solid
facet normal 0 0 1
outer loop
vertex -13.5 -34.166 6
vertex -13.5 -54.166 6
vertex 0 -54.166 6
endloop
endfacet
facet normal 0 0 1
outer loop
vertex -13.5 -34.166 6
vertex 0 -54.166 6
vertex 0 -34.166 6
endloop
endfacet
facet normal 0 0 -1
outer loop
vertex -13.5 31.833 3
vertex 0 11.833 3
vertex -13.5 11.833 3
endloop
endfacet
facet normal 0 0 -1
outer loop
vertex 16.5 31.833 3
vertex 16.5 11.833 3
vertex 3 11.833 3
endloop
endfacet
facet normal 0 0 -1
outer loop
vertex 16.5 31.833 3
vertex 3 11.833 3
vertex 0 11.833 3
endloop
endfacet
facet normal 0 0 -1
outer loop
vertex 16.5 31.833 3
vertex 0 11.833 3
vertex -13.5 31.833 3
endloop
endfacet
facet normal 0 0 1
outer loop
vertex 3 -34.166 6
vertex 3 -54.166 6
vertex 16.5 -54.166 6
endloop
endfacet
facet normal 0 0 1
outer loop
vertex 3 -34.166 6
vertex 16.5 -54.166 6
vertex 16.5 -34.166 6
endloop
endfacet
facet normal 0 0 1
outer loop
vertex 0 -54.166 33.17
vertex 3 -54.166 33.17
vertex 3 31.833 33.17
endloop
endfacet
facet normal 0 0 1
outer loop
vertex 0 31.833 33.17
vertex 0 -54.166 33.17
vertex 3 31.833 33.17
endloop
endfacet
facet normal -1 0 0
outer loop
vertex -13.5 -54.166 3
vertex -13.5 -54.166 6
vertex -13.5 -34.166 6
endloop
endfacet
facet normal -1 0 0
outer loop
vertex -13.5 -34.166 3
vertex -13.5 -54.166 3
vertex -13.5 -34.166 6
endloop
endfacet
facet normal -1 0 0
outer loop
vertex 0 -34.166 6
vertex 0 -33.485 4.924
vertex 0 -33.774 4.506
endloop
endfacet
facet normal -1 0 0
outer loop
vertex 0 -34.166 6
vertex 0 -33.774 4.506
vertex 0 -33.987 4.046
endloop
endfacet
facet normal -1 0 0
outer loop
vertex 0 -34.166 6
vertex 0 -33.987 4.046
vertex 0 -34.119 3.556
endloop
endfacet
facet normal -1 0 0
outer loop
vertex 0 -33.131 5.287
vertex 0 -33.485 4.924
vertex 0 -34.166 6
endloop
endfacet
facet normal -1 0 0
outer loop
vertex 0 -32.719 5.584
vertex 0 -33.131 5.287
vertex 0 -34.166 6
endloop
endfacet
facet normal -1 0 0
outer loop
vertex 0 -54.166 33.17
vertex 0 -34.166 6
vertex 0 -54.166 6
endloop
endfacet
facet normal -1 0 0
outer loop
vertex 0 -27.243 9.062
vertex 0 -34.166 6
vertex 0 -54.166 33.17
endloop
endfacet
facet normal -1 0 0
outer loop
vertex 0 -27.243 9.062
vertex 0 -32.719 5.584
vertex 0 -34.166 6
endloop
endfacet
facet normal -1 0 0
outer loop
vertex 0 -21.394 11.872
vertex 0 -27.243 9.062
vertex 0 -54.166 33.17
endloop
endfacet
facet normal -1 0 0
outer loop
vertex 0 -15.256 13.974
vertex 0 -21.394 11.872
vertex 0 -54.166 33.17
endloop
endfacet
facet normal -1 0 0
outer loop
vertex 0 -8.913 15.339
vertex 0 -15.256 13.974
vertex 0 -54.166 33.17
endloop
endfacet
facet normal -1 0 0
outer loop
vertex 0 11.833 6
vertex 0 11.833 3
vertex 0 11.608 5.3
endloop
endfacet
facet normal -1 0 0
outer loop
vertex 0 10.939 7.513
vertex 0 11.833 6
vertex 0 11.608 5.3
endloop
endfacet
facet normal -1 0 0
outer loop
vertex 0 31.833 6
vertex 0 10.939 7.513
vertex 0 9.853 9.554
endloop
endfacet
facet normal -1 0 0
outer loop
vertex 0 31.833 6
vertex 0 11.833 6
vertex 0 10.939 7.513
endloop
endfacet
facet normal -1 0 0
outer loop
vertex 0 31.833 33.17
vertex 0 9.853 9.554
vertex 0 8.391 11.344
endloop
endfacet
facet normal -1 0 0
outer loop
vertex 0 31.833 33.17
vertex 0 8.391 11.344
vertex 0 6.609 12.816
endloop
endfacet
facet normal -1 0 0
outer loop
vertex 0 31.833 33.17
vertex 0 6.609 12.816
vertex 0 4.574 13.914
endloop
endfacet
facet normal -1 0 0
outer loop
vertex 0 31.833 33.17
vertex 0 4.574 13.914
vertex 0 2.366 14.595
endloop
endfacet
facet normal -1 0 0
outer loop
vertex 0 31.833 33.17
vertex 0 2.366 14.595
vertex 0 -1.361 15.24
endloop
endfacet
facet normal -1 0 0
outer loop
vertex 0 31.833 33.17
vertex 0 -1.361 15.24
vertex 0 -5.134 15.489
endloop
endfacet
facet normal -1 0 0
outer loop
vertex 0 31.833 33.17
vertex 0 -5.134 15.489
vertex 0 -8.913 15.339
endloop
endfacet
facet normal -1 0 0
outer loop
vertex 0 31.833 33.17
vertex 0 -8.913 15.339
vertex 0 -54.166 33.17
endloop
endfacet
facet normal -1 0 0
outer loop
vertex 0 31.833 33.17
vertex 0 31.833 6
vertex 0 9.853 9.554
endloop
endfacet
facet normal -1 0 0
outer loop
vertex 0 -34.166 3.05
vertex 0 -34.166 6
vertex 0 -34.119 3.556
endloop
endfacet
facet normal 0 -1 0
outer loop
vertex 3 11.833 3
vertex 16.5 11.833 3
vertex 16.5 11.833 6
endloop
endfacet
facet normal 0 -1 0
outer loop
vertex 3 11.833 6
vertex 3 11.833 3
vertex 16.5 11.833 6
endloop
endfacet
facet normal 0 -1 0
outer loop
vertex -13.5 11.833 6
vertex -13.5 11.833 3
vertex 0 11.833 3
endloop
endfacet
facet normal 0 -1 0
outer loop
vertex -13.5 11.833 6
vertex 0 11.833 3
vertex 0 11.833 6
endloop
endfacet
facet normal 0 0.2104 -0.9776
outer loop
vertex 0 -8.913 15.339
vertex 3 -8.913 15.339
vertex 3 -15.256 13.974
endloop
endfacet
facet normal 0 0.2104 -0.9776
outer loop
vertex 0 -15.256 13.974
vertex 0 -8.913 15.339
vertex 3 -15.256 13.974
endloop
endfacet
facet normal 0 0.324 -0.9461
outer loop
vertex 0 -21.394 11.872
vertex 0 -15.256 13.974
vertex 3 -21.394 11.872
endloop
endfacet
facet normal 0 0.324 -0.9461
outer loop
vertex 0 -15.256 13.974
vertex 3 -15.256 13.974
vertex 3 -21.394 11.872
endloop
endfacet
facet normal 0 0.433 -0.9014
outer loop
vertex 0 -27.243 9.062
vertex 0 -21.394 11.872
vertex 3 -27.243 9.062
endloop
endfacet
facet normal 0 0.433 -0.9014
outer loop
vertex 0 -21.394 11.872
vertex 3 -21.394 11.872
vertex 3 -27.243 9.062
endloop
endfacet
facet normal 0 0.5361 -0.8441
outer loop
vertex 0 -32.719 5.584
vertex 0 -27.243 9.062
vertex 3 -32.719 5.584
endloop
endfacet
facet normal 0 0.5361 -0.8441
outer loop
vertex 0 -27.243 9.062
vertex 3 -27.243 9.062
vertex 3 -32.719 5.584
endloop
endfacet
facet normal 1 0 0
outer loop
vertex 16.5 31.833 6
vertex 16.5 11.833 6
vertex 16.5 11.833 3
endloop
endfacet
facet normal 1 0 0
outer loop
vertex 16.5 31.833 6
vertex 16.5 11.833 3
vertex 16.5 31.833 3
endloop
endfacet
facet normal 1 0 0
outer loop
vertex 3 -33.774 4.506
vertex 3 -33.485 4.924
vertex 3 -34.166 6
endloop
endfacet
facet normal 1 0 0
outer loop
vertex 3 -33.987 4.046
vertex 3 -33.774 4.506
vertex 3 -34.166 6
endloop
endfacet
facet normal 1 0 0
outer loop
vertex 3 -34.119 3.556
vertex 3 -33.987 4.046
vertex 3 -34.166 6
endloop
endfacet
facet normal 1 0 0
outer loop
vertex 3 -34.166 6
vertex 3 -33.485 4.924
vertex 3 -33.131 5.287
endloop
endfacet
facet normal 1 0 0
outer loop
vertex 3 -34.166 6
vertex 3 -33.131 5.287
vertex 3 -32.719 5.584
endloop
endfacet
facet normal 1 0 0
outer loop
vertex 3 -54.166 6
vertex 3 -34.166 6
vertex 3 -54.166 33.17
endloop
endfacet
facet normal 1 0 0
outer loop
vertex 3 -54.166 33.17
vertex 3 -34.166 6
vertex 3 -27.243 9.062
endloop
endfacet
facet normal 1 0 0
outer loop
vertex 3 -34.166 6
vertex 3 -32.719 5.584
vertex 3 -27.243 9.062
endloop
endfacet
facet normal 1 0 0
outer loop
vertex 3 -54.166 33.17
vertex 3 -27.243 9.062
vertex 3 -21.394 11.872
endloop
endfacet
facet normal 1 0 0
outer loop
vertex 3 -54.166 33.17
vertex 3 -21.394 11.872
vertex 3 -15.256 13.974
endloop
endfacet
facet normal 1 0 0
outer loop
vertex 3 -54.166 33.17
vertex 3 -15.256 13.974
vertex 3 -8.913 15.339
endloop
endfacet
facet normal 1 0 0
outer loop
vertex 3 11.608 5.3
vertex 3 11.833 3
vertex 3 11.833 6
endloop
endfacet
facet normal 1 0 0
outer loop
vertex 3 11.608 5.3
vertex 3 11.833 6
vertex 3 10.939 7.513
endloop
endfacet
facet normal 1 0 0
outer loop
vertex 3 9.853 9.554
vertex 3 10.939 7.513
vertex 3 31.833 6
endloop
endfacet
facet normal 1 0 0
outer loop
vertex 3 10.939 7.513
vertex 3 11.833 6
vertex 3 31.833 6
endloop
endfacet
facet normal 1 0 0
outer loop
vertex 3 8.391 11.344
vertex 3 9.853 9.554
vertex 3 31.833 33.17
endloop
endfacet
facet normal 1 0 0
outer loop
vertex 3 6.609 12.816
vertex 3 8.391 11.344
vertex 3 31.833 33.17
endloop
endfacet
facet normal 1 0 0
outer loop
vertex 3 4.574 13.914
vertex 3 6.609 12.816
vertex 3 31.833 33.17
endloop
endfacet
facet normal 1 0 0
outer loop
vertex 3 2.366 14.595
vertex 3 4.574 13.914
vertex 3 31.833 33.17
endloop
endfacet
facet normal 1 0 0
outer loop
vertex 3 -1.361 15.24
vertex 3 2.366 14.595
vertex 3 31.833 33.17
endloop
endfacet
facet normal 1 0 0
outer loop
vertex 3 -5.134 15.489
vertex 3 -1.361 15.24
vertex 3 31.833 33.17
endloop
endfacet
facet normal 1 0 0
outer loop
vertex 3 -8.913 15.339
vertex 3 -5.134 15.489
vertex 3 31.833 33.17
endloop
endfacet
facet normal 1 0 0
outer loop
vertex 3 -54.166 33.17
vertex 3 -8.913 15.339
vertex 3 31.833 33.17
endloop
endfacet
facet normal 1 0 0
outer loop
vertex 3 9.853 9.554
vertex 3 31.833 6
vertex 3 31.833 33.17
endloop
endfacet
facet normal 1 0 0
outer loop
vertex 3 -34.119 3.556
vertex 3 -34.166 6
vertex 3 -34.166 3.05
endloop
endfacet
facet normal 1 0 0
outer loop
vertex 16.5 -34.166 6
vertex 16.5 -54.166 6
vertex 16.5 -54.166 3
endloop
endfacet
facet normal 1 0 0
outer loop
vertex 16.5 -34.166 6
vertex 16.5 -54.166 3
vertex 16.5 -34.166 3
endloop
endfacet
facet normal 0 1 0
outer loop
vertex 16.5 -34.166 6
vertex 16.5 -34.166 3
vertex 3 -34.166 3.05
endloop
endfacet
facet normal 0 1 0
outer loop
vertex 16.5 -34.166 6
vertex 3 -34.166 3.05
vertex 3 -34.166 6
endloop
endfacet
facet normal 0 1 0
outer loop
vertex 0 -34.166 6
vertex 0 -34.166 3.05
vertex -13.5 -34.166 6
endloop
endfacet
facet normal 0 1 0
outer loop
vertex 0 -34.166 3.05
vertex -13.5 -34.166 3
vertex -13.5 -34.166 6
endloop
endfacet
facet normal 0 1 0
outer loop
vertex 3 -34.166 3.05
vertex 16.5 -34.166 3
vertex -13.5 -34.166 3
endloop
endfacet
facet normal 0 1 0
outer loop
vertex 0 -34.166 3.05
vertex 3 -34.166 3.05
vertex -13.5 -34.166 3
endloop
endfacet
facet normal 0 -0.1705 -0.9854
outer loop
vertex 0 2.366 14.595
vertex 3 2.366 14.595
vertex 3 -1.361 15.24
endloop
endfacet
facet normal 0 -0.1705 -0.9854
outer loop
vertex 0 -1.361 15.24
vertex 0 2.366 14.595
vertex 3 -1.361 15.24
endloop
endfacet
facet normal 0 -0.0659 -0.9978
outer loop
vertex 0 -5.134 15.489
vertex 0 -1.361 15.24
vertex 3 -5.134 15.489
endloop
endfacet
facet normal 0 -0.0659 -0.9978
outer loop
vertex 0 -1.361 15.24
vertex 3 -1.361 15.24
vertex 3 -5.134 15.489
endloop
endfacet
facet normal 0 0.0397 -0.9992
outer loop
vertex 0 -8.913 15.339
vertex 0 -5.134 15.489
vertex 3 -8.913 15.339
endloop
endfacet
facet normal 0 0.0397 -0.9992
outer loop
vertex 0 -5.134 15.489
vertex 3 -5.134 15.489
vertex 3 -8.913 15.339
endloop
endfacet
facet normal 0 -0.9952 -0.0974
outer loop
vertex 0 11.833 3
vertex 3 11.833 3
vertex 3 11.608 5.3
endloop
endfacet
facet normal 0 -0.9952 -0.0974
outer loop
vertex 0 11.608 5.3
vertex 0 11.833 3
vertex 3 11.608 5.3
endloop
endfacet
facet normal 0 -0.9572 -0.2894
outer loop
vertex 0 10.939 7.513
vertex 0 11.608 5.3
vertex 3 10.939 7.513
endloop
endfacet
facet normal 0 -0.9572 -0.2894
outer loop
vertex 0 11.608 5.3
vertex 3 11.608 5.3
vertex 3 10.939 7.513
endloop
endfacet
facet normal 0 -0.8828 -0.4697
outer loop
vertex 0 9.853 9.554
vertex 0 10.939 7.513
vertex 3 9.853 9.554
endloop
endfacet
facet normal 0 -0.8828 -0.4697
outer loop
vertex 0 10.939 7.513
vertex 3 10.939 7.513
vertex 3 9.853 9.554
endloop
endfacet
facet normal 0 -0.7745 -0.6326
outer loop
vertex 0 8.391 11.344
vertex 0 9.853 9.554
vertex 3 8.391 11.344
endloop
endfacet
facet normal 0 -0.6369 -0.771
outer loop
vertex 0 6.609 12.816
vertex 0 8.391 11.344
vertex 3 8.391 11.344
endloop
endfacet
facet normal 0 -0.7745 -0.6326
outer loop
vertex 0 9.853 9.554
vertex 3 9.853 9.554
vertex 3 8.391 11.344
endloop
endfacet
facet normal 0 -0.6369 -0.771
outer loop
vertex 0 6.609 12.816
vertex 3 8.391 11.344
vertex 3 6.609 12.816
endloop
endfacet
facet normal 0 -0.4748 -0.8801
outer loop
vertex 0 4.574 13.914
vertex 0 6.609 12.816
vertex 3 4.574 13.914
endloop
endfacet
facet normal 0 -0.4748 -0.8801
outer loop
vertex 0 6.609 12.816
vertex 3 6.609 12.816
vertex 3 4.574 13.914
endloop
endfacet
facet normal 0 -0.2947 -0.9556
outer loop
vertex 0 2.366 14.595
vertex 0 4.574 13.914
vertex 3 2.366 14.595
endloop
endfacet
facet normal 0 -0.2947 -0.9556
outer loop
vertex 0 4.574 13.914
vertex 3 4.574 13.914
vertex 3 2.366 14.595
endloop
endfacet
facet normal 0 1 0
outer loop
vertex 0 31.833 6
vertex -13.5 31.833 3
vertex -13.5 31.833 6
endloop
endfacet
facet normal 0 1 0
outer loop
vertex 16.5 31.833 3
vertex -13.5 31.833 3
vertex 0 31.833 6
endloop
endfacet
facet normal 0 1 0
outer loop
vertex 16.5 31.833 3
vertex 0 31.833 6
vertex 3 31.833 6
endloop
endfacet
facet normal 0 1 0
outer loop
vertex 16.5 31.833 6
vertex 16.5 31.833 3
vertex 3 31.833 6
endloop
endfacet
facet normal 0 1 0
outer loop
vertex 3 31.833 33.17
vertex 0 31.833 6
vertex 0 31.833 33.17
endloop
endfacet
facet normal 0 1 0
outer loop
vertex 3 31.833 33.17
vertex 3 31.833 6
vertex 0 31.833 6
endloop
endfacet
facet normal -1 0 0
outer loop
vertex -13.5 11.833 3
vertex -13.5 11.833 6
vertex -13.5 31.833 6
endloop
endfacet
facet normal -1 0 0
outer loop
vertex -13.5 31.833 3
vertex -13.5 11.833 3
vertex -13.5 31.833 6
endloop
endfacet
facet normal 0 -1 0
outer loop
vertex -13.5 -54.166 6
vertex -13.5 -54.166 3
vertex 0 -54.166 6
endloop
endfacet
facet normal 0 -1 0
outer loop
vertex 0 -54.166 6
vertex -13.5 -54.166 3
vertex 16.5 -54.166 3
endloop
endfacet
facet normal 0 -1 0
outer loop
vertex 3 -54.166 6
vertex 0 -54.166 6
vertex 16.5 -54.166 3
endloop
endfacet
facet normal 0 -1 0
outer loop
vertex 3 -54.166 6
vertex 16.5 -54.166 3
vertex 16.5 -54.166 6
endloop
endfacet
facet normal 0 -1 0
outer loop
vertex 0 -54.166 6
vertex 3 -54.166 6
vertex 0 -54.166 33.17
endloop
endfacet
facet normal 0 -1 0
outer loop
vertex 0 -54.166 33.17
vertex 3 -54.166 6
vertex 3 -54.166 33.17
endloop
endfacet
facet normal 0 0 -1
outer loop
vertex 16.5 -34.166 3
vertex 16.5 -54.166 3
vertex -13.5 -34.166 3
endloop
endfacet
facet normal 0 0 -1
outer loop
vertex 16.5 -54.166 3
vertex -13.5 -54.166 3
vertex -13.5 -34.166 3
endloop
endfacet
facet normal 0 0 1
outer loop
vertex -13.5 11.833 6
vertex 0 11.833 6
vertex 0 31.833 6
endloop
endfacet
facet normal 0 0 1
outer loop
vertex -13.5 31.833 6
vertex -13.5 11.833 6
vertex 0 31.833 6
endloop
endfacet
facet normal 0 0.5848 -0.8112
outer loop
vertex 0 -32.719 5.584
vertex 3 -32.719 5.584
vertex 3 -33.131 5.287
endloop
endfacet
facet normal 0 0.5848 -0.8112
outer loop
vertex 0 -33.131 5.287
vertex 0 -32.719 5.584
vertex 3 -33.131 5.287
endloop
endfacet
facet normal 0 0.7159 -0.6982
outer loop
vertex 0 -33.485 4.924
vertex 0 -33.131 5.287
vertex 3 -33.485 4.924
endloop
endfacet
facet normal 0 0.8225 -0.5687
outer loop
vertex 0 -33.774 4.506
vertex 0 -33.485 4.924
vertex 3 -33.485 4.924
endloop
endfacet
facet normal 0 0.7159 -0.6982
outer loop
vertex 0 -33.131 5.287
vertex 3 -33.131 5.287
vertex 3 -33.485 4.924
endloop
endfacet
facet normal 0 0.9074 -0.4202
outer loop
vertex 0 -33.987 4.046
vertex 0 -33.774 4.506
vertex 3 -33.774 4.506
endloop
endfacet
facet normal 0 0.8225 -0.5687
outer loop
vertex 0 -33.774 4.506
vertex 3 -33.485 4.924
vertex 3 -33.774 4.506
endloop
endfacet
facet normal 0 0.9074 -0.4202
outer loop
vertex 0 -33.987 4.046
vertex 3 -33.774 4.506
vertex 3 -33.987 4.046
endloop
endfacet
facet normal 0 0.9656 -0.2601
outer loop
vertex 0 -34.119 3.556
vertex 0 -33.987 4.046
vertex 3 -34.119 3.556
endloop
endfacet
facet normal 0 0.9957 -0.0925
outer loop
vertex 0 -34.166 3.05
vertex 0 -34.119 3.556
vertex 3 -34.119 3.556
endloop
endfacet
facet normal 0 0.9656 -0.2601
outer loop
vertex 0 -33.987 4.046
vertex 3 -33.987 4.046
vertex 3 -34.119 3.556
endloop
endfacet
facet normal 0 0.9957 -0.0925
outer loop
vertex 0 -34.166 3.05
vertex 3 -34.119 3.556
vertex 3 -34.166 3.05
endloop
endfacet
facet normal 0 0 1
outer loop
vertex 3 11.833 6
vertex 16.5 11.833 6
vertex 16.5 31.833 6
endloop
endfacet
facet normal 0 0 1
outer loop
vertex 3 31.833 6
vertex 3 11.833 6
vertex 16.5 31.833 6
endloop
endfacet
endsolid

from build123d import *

# Parameters (mm, degrees)
F1_DEPTH = 3
F2_ANGLE = 90
F7_W     = 20
F7_H     = 3
F8_DEPTH = 15


# Not quite as in the source:
# - ends of sketch curves that miss each other by under 0.0002 mm in the source are joined


with BuildPart() as f1:
    # F0 (on Top) → F1 (new body)
    with BuildSketch(Plane.XY):
        with BuildLine():
            ThreePointArc((2.5843454528, -32.7194872419), (1.4841670751, -33.7858704597), (0, -34.1664144431))
            Line((0, -34.1664144431), (0, -54.1664144431))
            Line((0, -54.1664144431), (30.1699284464, -54.1664144431))
            Line((30.1699284464, -54.1664144431), (30.1699284464, 31.83347))
            Line((30.1699284464, 31.83347), (0, 31.83347))
            Line((0, 31.83347), (0, 11.83347))
            ThreePointArc((0, 11.83347), (7.4846118013, 9.165784114), (11.5946270955, 2.3655094074))
            ThreePointArc((11.5946270955, 2.3655094074), (12.4147060347, -3.2443514979), (12.338869311, -8.913329936))
            ThreePointArc((12.338869311, -8.913329936), (8.8720047217, -21.3943156457), (2.5843454528, -32.7194872419))
        make_face()
    extrude(amount=F1_DEPTH)


with BuildPart() as f1_1:
    # F2: moved
    add(f1.part.rotate(Axis((0, -44.1664144431, 3), (0, -1, 0)), F2_ANGLE))

    # F7 (on 3pt) → F8 (join, symmetric)
    with BuildSketch(Plane.YZ.offset(1.5)):
        with Locations((-44.1664144431, 4.5)):
            Rectangle(F7_W, F7_H)
        with Locations((21.83347, 4.5)):
            Rectangle(F7_W, F7_H)
    extrude(amount=F8_DEPTH, both=True)


solid = f1_1.part
